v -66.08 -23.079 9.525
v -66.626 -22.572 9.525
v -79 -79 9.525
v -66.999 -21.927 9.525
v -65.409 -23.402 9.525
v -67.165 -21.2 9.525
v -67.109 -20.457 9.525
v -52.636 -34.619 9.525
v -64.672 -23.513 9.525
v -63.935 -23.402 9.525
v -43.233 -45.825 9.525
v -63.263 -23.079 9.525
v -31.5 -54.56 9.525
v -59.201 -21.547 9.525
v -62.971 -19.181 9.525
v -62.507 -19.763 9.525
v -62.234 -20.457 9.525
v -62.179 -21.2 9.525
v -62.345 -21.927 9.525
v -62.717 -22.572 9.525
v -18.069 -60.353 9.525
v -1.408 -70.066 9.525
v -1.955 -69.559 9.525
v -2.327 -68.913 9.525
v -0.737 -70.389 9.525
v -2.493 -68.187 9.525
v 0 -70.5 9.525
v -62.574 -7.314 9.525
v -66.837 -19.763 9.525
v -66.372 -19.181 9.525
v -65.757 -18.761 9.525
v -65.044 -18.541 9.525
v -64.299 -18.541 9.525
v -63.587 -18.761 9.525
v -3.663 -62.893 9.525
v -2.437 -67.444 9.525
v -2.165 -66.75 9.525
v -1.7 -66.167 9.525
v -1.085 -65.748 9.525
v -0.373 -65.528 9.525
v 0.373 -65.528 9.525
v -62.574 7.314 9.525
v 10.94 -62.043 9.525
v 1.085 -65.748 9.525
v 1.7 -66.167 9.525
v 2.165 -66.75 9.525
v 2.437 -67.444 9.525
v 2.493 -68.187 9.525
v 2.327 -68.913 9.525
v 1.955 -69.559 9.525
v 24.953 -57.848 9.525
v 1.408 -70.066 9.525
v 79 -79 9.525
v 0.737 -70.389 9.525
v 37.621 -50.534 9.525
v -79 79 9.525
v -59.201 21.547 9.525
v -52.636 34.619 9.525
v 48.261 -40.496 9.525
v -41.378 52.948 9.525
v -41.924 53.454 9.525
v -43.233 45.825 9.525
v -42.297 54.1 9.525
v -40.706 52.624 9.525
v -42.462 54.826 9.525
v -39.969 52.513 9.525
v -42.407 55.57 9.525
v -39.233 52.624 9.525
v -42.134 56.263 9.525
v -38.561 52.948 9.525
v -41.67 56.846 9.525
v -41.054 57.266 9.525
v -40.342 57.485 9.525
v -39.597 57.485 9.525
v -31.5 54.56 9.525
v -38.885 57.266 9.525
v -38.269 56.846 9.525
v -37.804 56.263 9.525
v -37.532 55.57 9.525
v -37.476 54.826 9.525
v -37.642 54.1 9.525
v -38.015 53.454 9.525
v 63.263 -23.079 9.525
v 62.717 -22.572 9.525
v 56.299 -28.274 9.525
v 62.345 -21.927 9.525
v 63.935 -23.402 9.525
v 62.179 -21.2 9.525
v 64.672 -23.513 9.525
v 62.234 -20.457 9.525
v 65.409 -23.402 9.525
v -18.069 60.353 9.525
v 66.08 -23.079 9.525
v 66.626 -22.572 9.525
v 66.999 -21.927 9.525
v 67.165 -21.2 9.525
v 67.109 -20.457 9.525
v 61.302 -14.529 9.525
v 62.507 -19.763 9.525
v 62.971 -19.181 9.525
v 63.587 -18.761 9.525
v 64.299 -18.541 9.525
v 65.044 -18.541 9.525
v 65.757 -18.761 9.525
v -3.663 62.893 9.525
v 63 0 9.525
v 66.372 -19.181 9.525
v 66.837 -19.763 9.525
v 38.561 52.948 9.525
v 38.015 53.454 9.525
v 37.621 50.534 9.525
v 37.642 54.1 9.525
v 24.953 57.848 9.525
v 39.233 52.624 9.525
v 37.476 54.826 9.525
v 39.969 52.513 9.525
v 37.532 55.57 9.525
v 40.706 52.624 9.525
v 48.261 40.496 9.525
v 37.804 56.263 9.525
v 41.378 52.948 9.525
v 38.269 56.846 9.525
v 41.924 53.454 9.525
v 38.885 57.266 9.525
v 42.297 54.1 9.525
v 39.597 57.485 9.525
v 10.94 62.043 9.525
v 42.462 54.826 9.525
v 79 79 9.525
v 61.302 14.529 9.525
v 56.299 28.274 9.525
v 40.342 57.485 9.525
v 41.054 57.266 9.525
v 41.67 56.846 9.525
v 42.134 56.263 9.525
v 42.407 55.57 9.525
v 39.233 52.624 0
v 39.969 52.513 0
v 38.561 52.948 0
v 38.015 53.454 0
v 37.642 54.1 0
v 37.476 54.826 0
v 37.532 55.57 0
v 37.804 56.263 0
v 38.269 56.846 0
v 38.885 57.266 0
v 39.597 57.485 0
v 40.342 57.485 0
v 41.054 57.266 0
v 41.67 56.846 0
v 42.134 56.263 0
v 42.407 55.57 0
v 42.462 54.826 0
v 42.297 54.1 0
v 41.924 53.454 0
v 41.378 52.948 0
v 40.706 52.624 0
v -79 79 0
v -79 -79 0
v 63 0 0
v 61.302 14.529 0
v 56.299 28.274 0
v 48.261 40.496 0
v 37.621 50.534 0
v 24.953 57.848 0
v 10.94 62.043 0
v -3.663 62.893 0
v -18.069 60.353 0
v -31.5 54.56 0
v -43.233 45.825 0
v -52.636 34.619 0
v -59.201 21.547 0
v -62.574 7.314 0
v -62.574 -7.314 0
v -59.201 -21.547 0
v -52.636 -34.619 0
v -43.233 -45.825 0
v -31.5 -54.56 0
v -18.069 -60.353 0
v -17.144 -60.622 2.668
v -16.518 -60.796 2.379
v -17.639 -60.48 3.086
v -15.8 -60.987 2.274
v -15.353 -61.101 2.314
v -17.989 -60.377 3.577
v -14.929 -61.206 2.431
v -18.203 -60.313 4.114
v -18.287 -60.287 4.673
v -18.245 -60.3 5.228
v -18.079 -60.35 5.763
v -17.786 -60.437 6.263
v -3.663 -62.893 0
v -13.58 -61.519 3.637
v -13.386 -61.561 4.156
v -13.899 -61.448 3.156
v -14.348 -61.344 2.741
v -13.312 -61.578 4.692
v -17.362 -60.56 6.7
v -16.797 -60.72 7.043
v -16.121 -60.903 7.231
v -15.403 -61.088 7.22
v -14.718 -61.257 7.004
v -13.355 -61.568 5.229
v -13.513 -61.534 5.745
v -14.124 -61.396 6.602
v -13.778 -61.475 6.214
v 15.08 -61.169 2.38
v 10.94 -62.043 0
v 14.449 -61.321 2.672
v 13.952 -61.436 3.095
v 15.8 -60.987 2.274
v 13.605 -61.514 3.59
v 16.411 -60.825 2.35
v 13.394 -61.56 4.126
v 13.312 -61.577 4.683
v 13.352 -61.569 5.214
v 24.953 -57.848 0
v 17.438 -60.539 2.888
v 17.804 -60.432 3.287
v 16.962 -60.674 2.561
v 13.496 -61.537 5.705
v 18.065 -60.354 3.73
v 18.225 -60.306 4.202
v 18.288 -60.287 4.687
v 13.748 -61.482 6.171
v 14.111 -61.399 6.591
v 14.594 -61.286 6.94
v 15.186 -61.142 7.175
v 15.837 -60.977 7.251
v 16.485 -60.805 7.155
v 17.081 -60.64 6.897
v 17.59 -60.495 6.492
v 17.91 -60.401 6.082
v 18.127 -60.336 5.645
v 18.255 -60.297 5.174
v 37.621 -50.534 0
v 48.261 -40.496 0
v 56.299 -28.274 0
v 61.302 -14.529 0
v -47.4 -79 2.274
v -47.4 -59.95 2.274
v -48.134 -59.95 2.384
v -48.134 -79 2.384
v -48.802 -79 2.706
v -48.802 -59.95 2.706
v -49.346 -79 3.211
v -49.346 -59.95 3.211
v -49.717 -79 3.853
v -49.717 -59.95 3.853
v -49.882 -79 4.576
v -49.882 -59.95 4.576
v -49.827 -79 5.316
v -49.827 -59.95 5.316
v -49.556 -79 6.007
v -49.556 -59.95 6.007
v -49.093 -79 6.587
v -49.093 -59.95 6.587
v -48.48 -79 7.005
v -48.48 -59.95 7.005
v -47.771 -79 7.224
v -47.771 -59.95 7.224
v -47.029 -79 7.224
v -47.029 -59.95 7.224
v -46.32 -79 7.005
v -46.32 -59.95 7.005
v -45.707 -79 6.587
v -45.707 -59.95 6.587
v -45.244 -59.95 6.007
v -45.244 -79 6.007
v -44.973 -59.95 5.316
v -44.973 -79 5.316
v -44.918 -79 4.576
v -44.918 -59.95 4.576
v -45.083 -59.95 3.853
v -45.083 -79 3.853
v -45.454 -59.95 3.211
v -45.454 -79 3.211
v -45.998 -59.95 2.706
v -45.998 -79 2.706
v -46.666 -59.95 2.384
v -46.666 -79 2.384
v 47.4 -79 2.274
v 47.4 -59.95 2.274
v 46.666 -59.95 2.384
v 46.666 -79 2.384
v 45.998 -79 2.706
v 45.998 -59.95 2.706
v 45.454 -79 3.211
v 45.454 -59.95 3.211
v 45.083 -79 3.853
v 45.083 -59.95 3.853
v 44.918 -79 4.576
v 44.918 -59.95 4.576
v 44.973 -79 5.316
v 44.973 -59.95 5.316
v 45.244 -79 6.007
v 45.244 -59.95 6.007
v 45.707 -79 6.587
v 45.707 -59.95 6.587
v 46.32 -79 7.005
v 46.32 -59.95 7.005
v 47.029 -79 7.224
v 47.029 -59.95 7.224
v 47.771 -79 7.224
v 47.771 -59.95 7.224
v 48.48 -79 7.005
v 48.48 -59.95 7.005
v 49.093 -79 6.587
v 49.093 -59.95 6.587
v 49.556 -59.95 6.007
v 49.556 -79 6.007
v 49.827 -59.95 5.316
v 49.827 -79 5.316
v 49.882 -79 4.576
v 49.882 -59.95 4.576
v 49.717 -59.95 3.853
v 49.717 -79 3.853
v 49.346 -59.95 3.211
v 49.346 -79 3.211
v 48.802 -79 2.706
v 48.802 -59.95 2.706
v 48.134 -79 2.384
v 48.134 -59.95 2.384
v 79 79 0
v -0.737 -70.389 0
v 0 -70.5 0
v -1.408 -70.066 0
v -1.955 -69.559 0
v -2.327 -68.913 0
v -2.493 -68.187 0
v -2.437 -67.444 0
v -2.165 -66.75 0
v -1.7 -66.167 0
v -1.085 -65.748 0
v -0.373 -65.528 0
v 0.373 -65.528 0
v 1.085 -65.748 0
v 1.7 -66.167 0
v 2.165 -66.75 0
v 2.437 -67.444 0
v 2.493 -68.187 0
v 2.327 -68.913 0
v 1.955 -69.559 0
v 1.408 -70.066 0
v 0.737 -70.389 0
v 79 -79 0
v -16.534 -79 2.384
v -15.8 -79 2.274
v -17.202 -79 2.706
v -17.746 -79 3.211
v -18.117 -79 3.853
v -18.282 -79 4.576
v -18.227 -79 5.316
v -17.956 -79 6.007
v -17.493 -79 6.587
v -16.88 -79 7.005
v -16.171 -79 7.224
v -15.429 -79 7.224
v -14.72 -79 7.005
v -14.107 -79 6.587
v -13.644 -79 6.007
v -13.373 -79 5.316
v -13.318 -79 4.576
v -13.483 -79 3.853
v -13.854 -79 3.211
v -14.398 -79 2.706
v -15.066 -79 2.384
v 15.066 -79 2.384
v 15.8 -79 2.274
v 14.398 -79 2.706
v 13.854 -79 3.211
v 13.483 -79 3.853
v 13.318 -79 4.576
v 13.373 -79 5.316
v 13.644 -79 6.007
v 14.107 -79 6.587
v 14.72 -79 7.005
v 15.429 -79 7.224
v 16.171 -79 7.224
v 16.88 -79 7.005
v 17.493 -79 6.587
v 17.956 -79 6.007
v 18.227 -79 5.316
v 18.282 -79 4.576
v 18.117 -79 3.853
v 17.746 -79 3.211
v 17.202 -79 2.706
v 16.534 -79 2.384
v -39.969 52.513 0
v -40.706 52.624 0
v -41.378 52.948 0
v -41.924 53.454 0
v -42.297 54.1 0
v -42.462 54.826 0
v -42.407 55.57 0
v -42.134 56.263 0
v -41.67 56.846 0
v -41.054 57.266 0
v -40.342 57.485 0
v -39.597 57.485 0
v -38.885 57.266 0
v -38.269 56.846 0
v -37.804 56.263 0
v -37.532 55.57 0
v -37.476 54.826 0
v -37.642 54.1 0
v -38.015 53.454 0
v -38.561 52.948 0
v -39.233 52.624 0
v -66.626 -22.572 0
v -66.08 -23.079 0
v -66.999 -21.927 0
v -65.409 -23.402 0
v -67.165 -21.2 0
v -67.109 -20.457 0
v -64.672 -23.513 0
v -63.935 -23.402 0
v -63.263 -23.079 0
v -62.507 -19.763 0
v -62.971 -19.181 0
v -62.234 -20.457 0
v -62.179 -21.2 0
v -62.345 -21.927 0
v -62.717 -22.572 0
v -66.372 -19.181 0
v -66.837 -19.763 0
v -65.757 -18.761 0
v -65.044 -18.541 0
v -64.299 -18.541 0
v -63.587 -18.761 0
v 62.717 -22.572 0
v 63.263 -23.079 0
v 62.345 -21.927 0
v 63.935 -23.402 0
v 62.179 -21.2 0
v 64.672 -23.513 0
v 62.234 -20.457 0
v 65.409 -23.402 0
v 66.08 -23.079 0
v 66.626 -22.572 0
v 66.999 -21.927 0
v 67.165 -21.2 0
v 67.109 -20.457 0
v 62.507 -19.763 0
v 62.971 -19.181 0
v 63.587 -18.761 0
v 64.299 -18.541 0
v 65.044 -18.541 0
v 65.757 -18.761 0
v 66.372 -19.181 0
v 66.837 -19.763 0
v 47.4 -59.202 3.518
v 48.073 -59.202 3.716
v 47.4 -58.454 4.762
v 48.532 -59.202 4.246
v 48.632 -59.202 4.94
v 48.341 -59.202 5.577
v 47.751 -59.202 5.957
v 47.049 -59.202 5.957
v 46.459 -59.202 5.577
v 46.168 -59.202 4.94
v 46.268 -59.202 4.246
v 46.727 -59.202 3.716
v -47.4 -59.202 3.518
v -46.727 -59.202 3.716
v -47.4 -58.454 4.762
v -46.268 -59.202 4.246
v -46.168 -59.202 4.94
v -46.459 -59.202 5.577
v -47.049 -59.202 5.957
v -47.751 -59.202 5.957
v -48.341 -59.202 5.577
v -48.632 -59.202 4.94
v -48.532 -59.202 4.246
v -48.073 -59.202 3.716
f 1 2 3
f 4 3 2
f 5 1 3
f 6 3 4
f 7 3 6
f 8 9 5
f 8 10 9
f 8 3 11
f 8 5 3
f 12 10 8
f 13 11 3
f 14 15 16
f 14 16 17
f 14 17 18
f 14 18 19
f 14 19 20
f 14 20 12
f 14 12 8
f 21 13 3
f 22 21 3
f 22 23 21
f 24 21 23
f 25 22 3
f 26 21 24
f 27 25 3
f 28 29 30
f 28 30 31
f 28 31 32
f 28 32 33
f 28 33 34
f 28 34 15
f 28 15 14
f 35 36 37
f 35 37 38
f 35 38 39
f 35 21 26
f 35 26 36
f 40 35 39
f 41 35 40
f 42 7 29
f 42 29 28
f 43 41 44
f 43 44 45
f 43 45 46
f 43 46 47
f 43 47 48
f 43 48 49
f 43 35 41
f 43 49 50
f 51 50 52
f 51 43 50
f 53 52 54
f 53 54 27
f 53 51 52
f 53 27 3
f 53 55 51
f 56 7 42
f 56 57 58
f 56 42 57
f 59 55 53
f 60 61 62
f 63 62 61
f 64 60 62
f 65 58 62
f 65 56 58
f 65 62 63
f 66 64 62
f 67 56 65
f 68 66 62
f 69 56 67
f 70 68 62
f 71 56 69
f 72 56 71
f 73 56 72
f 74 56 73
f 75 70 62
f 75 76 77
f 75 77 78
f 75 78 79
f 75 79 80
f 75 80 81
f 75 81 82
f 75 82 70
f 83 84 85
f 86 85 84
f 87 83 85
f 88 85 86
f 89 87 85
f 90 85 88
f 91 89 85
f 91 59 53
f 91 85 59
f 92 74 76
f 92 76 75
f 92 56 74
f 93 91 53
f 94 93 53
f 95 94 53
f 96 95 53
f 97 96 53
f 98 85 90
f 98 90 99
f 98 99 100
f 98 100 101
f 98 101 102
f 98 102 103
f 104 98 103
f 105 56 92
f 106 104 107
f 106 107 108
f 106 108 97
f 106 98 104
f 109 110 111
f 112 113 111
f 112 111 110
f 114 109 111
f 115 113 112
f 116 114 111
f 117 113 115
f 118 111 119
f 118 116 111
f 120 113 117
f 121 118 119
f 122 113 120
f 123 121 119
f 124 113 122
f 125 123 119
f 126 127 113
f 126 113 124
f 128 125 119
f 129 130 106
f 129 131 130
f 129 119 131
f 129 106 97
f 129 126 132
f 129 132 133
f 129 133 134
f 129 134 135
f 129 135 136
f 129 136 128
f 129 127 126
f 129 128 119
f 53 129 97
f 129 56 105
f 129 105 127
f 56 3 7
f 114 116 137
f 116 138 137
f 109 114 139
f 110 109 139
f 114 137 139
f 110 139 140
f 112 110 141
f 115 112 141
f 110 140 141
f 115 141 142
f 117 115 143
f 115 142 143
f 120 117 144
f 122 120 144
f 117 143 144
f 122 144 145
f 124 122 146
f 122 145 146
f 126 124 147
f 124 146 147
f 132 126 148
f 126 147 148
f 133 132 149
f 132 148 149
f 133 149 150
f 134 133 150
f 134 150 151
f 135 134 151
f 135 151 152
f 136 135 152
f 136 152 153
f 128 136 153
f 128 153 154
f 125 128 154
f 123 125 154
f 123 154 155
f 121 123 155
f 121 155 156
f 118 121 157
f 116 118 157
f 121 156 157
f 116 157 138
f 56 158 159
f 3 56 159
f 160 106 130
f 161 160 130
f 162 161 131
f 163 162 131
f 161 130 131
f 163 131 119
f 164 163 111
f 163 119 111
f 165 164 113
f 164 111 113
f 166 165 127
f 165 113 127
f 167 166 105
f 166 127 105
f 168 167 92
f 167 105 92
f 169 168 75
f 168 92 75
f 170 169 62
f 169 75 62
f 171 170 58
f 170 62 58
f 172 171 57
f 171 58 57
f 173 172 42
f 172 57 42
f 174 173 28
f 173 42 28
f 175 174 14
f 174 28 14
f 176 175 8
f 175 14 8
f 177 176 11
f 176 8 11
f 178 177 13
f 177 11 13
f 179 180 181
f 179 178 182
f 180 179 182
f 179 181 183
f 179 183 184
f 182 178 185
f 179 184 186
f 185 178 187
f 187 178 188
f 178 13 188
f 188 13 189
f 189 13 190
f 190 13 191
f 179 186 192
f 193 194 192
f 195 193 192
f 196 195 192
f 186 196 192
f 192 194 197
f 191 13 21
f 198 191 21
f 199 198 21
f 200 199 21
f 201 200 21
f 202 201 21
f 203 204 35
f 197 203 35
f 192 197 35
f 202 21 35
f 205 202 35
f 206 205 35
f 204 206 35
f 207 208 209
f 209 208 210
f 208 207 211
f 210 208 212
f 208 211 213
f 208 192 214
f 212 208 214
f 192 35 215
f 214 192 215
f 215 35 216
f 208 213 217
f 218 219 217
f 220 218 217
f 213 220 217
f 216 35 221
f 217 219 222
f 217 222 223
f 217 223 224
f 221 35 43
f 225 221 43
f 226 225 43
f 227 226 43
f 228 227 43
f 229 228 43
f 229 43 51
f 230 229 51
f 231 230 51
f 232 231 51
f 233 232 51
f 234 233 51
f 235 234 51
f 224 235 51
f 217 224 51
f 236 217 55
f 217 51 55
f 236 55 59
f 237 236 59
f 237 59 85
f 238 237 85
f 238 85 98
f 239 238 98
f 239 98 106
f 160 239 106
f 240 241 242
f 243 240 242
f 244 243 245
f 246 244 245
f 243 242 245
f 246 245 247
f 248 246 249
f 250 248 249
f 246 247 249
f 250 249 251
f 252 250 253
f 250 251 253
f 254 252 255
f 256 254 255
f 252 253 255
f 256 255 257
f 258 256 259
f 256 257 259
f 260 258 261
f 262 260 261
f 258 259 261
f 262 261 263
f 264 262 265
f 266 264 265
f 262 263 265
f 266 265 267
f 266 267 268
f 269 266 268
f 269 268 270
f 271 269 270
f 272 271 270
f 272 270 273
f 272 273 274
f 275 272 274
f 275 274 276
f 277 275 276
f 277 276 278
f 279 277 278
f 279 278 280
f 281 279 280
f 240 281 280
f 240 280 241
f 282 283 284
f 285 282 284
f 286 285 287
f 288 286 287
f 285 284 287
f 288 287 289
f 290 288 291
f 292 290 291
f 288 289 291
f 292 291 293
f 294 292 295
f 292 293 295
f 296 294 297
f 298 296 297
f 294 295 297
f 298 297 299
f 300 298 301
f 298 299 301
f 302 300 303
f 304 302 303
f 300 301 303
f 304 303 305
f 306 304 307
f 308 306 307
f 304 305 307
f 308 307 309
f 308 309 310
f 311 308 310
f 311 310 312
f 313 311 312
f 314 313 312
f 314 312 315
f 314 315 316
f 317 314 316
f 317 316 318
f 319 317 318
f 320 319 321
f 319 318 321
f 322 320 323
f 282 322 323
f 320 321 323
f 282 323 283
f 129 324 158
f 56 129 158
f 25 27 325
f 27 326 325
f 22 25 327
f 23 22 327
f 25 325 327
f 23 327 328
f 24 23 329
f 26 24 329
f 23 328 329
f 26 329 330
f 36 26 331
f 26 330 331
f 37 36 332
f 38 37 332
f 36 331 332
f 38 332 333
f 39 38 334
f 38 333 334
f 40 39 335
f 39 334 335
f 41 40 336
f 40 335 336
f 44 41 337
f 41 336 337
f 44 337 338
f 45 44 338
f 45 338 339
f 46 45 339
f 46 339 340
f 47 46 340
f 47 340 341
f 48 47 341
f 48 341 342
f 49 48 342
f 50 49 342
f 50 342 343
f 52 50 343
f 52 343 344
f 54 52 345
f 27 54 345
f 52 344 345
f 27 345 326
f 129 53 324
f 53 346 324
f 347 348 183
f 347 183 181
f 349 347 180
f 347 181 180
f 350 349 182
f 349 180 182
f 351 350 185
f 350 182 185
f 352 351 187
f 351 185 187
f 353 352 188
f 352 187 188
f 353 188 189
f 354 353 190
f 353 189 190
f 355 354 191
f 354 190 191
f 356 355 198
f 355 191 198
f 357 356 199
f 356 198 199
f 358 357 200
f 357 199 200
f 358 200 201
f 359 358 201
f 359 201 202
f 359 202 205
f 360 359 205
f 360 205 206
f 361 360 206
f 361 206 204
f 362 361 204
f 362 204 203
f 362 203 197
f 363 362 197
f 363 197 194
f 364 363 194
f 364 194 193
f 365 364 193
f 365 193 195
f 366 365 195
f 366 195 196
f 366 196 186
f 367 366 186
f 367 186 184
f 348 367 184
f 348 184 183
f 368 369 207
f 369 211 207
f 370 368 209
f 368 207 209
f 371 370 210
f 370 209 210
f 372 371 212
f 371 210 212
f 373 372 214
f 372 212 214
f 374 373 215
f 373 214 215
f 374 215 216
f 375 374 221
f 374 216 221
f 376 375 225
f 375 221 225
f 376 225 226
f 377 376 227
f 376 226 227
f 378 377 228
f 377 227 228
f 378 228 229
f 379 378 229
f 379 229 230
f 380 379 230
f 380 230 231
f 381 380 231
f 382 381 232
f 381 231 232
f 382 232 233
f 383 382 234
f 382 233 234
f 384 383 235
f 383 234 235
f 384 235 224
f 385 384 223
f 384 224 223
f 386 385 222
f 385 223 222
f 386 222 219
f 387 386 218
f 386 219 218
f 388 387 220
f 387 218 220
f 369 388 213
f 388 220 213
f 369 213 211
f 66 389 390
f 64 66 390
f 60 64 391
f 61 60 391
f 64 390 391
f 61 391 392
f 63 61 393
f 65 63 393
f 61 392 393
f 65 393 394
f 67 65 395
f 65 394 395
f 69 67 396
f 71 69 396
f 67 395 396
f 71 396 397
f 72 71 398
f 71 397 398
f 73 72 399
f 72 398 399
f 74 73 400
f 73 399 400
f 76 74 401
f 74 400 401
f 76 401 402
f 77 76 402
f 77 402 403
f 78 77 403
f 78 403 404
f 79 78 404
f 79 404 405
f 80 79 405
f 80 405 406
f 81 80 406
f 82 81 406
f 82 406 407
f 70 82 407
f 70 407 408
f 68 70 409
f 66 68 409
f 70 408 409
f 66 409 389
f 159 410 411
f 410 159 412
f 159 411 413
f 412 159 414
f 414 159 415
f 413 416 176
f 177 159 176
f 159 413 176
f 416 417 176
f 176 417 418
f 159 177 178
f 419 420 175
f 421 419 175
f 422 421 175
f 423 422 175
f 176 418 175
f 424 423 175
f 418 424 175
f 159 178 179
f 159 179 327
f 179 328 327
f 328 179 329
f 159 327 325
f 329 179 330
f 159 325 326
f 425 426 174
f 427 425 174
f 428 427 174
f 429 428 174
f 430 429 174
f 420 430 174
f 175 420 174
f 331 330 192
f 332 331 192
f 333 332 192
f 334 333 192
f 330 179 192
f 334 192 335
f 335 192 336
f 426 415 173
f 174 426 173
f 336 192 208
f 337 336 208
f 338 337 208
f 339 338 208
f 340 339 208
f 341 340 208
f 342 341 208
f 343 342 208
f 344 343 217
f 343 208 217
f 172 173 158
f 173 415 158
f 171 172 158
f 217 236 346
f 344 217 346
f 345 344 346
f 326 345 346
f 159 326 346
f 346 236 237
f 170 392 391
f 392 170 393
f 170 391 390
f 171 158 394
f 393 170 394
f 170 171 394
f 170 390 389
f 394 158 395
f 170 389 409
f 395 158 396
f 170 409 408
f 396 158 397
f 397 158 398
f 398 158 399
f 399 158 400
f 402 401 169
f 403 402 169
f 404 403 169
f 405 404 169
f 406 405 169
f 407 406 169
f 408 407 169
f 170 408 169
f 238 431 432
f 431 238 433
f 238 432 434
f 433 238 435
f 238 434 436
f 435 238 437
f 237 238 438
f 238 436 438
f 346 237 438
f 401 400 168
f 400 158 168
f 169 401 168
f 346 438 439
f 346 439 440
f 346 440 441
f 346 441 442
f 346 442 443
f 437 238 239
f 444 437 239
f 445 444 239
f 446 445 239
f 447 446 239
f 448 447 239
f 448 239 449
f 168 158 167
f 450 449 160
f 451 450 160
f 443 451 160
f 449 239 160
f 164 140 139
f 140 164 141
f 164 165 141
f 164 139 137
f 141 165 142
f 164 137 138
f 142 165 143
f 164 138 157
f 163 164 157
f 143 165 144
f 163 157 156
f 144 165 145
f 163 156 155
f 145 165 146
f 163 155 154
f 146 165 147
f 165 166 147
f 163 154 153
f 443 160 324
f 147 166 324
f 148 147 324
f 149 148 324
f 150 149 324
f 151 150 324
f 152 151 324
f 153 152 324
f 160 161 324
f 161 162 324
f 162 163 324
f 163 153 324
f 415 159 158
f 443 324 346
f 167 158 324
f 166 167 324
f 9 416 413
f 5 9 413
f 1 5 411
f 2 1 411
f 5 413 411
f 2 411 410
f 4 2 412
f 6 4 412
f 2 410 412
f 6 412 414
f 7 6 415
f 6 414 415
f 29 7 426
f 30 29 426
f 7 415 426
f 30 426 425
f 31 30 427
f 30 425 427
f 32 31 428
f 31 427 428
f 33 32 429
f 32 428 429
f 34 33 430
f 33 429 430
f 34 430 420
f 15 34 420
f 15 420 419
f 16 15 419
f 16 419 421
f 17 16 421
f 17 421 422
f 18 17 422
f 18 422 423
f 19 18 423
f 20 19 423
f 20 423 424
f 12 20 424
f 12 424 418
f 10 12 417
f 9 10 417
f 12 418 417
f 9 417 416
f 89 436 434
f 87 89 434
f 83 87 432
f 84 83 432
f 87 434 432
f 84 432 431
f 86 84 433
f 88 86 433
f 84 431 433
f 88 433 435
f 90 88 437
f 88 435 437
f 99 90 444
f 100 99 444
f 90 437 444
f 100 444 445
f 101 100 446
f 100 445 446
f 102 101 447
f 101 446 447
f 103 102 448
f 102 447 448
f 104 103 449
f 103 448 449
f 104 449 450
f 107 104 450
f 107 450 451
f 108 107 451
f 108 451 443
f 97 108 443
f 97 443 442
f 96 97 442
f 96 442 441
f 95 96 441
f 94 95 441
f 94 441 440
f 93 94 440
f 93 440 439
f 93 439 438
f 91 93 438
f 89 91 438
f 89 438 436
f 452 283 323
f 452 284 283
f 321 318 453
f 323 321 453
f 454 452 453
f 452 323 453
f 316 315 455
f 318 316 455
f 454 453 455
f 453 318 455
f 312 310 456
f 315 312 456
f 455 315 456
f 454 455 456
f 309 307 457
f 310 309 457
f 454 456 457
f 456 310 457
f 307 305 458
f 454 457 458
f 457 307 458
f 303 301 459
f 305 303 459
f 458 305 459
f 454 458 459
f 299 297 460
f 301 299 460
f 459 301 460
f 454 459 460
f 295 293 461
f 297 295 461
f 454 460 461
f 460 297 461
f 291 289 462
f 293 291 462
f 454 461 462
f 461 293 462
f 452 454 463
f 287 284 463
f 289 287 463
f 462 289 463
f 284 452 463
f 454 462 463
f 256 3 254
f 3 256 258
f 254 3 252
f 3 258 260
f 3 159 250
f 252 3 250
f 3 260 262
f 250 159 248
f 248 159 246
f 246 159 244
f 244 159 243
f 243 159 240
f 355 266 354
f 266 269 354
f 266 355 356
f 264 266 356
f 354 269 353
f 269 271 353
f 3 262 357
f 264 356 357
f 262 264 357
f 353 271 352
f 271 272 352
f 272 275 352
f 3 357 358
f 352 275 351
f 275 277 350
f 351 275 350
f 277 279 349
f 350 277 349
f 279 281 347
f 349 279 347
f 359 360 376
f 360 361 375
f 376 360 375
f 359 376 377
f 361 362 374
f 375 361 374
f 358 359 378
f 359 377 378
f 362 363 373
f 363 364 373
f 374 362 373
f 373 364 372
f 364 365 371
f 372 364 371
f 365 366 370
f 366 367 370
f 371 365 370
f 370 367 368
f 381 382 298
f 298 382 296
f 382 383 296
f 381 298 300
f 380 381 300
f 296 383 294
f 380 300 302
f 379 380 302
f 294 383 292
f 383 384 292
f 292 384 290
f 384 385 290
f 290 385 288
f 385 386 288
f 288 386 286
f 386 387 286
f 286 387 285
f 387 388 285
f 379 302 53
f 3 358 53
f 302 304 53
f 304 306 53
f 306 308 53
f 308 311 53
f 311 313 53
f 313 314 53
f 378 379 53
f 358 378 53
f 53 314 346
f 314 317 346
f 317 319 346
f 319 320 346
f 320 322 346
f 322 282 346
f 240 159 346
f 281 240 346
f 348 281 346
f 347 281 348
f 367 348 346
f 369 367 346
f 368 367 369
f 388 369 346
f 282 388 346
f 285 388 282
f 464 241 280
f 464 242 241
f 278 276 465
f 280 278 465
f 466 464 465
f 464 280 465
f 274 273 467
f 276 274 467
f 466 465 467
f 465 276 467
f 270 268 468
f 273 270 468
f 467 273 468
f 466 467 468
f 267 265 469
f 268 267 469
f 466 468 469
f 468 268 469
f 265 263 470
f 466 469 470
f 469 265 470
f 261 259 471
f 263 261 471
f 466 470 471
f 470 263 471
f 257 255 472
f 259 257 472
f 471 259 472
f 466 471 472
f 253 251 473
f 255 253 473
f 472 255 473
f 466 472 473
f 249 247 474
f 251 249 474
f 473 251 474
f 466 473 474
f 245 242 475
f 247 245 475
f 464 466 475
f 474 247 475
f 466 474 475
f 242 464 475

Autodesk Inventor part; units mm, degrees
ref_plane "YZ Plane" through (0, 0, 0) normal (1, 0, 0) x (0, 1, 0)
ref_plane "XZ Plane" through (0, 0, 0) normal (0, 1, 0) x (-1, 0, 0)
ref_plane "XY Plane" through (0, 0, 0) normal (0, 0, 1) x (1, 0, 0)
sketch "Sketch1" plane through (0, 0, 0) normal (0, 0, 1) x (1, 0, 0)
  line L0 (-79, -79) -> (79, -79)
  line L1 (79, -79) -> (79, 79)
  line L2 (79, 79) -> (-79, 79)
  line L3 (-79, 79) -> (-79, -79)
  line L4 (-79, 0) -> (0, 0) construction
  line L5 (0, 0) -> (0, -79) construction
  point P0 (0, -79)
  dimension "d0" = 158
  dimension "d1" = 158
extrude "Extrusion1" add sketch "Sketch1" along normal blind 9.525
sketch "Sketch2" plane through (0, 0, 9.525) normal (0, 0, 1) x (1, 0, 0)
  circle A0 centre (0, 0) radius 68 construction
  line L0 (0, 0) -> (0, -68) construction
  circle A1 centre (0, 0) radius 68 construction
  circle A2 centre (0, 0) radius 68 construction
  circle A3 centre (0, 0) radius 68 construction
  circle A4 centre (0, 0) radius 68 construction
  point P0 (64.6718, -21.0132)
  point P1 (64.6718, -21.0132)
  point P2 (39.9694, 55.0132)
  point P3 (39.9694, 55.0132)
  point P4 (-39.9694, 55.0132)
  point P5 (-39.9694, 55.0132)
  point P6 (-64.6718, -21.0132)
  point P7 (-64.6718, -21.0132)
  dimension "d4" = 136
  dimension "d7" = 360
hole "Hole1" at (0, -68, 9.525) at (64.6718, -21.0132, 9.525) at (39.9694, 55.0132, 9.525) at (-39.9694, 55.0132, 9.525) at (-64.6718, -21.0132, 9.525) direction (0, 0, -1) diameter 5 end through all
sketch "Sketch4" plane through (0, 0, 9.525) normal (0, 0, 1) x (1, 0, 0)
  line L0 (79, -79) -> (79, 79) construction
  line L1 (79, 79) -> (-79, 79) construction
  line L2 (-79, 79) -> (-79, -79) construction
  line L3 (-79, -79) -> (79, -79) construction
  line L4 (-79, 0) -> (79, 0) construction
  line L5 (0, 79) -> (0, -79) construction
  circle A0 centre (0, 0) radius 63
  dimension "d16" = 126
extrude "Extrusion2" cut sketch "Sketch4" against normal through all
sketch "Sketch5" plane through (-79, -79, 0) normal (0, -1, 0) x (1, 0, 0)
  line L0 (158, 0) -> (158, 9.525) construction
  line L1 (0, 9.525) -> (158, 9.525) construction
  line L2 (0, 0) -> (158, 0) construction
  line L3 (0, 0) -> (0, 9.525) construction
  line L4 (0, 4.7625) -> (158, 4.7625) construction
  point P0 (79, 0)
  point P1 (31.6, 4.7625)
  point P2 (126.4, 4.7625)
  point P3 (94.8, 4.7625)
  point P4 (63.2, 4.7625)
  dimension "d19" = 31.6
  dimension "d20" = 31.6
  dimension "d21" = 31.6
  dimension "d22" = 31.6
  dimension "d23" = 31.6
hole "Hole2" at (-47.4, -79, 4.7625) at (47.4, -79, 4.7625) at (15.8, -79, 4.7625) at (-15.8, -79, 4.7625) direction (0, 1, 0) diameter 4.978 depth 19.05 tip angle 118 thread size "1/4-20 UNC" class "2B" standard "ANSI Unified Screw Threads"
properties part number "face_part"
